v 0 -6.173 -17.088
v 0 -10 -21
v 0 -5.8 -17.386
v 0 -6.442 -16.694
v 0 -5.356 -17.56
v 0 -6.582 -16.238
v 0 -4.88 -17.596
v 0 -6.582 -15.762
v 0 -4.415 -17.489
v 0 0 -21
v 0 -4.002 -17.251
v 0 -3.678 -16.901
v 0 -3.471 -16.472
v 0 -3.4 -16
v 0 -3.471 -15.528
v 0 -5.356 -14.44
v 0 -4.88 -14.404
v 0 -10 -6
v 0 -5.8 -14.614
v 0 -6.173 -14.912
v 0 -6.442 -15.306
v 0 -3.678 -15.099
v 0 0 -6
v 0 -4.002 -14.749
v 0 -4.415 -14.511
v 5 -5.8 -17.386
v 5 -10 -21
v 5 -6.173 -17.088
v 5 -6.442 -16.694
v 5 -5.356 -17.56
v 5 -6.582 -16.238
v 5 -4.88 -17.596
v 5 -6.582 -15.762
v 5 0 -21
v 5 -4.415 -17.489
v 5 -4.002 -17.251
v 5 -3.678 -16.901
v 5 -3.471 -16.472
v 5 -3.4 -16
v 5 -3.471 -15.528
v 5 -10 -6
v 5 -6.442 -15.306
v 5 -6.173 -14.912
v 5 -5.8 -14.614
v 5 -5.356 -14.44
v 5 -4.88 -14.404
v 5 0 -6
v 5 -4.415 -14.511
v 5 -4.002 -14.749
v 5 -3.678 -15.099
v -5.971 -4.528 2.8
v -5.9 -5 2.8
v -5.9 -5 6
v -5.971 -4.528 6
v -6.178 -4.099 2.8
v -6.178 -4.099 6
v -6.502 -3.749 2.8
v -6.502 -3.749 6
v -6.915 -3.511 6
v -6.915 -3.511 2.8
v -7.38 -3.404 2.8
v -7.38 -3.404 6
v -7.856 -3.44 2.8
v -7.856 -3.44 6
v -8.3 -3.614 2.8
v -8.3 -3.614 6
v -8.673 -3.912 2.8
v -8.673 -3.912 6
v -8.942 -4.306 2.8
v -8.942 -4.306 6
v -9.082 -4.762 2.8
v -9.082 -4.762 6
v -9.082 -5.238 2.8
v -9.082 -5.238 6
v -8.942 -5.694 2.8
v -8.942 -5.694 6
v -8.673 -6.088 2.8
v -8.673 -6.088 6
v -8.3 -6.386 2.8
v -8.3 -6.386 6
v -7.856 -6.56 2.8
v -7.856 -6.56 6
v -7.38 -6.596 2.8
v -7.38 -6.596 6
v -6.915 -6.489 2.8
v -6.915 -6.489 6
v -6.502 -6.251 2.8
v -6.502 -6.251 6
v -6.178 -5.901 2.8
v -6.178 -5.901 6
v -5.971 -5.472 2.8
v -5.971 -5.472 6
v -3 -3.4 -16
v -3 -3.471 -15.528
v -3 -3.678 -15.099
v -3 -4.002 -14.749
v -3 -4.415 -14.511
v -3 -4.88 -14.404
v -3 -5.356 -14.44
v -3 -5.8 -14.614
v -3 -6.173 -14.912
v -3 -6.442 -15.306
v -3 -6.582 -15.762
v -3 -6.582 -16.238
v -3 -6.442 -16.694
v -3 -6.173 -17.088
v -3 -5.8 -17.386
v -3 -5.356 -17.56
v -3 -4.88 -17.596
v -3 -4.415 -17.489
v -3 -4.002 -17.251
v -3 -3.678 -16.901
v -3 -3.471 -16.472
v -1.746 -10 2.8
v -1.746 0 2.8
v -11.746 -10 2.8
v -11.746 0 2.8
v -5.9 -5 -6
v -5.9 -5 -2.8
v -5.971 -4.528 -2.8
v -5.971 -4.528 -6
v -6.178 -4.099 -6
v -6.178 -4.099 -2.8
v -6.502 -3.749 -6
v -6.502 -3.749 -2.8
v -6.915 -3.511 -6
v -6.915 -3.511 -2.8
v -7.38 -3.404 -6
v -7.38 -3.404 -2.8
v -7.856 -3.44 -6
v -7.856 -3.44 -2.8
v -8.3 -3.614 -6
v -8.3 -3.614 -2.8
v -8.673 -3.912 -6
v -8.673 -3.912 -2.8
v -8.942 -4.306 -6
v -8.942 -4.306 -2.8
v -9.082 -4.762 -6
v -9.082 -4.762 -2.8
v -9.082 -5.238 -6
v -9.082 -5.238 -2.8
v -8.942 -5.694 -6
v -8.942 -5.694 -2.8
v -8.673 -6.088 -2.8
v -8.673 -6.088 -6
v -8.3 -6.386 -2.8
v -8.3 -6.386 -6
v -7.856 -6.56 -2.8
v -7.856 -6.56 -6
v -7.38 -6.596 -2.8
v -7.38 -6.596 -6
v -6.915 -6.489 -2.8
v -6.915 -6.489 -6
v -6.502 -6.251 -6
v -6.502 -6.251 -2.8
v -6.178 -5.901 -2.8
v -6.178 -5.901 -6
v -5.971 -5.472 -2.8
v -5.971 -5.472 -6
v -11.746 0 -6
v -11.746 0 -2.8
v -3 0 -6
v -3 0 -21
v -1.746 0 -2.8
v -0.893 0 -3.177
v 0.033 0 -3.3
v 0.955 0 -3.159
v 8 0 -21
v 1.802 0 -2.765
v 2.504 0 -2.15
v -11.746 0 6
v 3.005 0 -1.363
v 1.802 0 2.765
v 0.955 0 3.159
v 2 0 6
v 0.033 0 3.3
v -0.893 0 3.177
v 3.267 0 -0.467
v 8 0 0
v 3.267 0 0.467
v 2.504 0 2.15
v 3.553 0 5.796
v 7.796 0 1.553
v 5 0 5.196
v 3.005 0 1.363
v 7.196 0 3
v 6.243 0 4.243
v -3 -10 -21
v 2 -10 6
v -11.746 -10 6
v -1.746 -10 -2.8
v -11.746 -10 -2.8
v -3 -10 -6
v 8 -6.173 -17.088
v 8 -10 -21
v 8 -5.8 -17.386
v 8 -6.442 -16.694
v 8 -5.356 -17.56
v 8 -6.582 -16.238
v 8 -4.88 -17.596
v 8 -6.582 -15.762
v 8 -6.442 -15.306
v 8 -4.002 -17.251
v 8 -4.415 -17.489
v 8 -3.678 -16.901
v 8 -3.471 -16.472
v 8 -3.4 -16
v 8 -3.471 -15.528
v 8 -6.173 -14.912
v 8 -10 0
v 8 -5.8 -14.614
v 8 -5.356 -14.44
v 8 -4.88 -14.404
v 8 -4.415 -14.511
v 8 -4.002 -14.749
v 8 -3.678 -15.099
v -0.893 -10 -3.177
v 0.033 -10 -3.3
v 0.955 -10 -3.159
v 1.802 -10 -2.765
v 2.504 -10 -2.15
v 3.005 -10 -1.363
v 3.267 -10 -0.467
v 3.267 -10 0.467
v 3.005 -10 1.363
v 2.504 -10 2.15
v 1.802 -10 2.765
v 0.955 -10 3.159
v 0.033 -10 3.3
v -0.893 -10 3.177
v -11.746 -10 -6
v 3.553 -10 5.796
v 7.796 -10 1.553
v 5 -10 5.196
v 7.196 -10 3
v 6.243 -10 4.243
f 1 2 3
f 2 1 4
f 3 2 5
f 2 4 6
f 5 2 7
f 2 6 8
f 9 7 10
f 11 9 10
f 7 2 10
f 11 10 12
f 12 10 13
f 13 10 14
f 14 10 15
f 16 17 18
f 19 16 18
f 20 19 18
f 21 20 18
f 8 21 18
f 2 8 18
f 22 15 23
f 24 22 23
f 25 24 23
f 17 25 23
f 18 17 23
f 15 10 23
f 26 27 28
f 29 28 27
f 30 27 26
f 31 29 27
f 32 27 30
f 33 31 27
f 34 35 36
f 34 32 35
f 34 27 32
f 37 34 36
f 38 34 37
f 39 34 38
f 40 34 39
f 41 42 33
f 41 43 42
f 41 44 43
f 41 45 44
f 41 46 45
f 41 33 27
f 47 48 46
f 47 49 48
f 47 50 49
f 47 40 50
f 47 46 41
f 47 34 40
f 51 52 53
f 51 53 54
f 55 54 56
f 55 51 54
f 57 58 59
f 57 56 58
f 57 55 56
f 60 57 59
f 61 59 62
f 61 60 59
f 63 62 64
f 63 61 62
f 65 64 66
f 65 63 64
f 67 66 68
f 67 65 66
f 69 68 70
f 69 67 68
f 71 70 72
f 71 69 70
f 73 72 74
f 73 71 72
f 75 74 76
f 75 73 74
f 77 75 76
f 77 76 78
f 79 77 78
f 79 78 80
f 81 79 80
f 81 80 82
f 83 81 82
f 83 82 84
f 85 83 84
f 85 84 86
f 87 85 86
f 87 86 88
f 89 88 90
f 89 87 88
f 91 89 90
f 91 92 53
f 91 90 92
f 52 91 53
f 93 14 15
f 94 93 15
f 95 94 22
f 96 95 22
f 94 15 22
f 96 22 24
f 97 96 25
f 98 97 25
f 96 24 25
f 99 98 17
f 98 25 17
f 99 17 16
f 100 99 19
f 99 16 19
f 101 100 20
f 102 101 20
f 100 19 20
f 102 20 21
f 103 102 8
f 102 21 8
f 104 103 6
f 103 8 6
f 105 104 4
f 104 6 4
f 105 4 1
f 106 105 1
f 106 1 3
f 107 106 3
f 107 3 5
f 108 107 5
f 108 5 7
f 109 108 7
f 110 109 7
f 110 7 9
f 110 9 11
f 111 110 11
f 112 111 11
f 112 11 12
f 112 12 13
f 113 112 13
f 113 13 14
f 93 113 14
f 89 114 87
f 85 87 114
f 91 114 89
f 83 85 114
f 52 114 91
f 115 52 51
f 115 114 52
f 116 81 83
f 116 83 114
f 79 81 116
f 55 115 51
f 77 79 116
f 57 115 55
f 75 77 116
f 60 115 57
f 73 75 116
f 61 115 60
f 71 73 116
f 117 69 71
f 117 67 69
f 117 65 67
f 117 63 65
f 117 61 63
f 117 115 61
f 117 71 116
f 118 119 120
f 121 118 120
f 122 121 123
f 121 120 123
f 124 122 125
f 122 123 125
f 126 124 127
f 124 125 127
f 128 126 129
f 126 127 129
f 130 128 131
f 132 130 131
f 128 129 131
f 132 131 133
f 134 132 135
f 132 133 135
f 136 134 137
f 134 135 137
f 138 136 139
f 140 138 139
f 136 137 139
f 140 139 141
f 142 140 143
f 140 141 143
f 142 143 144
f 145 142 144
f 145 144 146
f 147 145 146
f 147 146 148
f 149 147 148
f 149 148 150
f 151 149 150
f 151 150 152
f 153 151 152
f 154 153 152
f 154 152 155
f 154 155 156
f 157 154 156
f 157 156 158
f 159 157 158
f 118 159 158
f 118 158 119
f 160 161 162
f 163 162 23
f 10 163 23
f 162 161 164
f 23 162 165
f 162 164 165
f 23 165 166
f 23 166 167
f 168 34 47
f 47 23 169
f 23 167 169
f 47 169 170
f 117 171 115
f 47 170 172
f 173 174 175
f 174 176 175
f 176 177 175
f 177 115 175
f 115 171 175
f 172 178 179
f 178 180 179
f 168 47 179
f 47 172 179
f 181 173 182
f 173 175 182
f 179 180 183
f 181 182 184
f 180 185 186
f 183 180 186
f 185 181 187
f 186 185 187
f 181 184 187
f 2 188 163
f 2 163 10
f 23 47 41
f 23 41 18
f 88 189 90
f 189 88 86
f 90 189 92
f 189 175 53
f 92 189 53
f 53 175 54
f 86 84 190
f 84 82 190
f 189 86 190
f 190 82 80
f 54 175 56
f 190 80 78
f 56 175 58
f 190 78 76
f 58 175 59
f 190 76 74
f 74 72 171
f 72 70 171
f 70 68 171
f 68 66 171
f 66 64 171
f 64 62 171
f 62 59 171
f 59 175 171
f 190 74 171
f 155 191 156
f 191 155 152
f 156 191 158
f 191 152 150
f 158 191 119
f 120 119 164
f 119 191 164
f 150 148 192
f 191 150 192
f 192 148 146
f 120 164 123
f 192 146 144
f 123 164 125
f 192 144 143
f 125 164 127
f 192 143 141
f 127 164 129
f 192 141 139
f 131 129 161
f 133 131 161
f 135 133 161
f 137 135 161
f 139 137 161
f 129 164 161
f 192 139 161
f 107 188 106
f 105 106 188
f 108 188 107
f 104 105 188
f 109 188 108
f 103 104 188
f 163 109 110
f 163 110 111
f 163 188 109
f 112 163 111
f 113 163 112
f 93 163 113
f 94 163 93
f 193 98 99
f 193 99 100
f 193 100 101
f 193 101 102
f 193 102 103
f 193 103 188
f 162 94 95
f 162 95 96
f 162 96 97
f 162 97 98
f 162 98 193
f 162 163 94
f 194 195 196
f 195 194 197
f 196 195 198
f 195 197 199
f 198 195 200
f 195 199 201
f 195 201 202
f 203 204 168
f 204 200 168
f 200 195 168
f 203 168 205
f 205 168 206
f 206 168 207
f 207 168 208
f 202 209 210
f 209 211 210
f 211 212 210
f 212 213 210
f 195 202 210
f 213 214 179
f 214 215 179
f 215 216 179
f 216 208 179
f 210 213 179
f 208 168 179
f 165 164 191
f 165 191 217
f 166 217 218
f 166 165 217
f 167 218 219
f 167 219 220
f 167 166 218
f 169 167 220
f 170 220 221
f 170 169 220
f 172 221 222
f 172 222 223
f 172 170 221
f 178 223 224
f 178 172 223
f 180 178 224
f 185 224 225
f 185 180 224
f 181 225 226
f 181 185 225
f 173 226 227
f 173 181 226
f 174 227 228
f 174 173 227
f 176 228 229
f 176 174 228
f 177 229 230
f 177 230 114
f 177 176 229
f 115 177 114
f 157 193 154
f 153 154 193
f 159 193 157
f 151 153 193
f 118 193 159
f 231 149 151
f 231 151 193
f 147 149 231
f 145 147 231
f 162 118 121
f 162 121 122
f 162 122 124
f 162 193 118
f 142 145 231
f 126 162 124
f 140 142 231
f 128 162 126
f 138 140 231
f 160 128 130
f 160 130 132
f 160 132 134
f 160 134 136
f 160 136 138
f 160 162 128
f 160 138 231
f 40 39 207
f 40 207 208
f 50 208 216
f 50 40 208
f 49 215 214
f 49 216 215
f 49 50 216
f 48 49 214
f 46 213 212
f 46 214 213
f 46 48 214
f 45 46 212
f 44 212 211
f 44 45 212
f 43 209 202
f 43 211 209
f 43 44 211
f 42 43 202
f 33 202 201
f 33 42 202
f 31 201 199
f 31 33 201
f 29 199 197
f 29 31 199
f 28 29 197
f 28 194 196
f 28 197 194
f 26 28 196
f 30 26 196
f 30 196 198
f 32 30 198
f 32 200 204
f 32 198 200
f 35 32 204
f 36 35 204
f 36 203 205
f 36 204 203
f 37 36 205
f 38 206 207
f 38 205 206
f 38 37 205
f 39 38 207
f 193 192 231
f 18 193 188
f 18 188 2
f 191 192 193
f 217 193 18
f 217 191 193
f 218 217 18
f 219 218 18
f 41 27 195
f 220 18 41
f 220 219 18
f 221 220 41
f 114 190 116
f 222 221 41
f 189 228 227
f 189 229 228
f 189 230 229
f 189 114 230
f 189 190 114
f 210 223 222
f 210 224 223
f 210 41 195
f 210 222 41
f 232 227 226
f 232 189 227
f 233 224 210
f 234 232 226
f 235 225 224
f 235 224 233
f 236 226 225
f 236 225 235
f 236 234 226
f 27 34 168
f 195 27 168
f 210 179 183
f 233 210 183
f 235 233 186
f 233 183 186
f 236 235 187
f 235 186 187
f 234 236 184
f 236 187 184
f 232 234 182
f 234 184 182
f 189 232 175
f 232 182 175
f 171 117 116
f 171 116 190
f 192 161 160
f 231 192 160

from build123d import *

# Parameters (mm, degrees)
PAD_DEPTH            = 10
SKETCH005_R          = 1.6
POCKET001_DEPTH      = 6.001
POCKET001_DEPTH_BACK = -6.001
SKETCH_W             = 3
SKETCH_H             = 15
PAD001_DEPTH         = 10
SKETCH006_R          = 1.6
POCKET_DEPTH         = 8.001
POCKET_DEPTH_BACK    = 11.747425


with BuildPart() as part:
    # Sketch003 → Pad (new body)
    with BuildSketch(Plane.XZ):
        with BuildLine():
            Line((8, -6), (-11.746425, -6))
            Line((-11.746425, -2.8), (-11.746425, -6))
            Line((-1.746425, -2.8), (-11.746425, -2.8))
            ThreePointArc((-1.746425, -2.8), (3.3, 0), (-1.746425, 2.8))
            Line((-1.746425, 2.8), (-11.746425, 2.8))
            Line((-11.746425, 2.8), (-11.746425, 6))
            Line((2, 6), (-11.746425, 6))
            ThreePointArc((8, 0), (6.242641, 4.242641), (2, 6))
            Line((8, 0), (8, -6))
        make_face()
    extrude(amount=PAD_DEPTH)

    # Sketch005 → Pocket001 (cut, two sides)
    with BuildSketch(Plane.XY) as pocket001_sk:
        with Locations((-7.5, -5)):
            Circle(SKETCH005_R)
    extrude(amount=-POCKET001_DEPTH, mode=Mode.SUBTRACT)
    extrude(pocket001_sk.sketch, amount=-POCKET001_DEPTH_BACK, mode=Mode.SUBTRACT)

    # Sketch → Pad001 (join)
    with BuildSketch(Plane.XZ):
        with Locations((6.5, -13.5)):
            Rectangle(SKETCH_W, SKETCH_H)
        with Locations((-1.5, -13.5)):
            Rectangle(SKETCH_W, SKETCH_H)
    extrude(amount=PAD001_DEPTH)

    # Sketch006 → Pocket (cut, two sides)
    with BuildSketch(Plane.YZ) as pocket_sk:
        with Locations((-5, -16)):
            Circle(SKETCH006_R)
    extrude(amount=POCKET_DEPTH, mode=Mode.SUBTRACT)
    extrude(pocket_sk.sketch, amount=-POCKET_DEPTH_BACK, mode=Mode.SUBTRACT)


solid = part.part
